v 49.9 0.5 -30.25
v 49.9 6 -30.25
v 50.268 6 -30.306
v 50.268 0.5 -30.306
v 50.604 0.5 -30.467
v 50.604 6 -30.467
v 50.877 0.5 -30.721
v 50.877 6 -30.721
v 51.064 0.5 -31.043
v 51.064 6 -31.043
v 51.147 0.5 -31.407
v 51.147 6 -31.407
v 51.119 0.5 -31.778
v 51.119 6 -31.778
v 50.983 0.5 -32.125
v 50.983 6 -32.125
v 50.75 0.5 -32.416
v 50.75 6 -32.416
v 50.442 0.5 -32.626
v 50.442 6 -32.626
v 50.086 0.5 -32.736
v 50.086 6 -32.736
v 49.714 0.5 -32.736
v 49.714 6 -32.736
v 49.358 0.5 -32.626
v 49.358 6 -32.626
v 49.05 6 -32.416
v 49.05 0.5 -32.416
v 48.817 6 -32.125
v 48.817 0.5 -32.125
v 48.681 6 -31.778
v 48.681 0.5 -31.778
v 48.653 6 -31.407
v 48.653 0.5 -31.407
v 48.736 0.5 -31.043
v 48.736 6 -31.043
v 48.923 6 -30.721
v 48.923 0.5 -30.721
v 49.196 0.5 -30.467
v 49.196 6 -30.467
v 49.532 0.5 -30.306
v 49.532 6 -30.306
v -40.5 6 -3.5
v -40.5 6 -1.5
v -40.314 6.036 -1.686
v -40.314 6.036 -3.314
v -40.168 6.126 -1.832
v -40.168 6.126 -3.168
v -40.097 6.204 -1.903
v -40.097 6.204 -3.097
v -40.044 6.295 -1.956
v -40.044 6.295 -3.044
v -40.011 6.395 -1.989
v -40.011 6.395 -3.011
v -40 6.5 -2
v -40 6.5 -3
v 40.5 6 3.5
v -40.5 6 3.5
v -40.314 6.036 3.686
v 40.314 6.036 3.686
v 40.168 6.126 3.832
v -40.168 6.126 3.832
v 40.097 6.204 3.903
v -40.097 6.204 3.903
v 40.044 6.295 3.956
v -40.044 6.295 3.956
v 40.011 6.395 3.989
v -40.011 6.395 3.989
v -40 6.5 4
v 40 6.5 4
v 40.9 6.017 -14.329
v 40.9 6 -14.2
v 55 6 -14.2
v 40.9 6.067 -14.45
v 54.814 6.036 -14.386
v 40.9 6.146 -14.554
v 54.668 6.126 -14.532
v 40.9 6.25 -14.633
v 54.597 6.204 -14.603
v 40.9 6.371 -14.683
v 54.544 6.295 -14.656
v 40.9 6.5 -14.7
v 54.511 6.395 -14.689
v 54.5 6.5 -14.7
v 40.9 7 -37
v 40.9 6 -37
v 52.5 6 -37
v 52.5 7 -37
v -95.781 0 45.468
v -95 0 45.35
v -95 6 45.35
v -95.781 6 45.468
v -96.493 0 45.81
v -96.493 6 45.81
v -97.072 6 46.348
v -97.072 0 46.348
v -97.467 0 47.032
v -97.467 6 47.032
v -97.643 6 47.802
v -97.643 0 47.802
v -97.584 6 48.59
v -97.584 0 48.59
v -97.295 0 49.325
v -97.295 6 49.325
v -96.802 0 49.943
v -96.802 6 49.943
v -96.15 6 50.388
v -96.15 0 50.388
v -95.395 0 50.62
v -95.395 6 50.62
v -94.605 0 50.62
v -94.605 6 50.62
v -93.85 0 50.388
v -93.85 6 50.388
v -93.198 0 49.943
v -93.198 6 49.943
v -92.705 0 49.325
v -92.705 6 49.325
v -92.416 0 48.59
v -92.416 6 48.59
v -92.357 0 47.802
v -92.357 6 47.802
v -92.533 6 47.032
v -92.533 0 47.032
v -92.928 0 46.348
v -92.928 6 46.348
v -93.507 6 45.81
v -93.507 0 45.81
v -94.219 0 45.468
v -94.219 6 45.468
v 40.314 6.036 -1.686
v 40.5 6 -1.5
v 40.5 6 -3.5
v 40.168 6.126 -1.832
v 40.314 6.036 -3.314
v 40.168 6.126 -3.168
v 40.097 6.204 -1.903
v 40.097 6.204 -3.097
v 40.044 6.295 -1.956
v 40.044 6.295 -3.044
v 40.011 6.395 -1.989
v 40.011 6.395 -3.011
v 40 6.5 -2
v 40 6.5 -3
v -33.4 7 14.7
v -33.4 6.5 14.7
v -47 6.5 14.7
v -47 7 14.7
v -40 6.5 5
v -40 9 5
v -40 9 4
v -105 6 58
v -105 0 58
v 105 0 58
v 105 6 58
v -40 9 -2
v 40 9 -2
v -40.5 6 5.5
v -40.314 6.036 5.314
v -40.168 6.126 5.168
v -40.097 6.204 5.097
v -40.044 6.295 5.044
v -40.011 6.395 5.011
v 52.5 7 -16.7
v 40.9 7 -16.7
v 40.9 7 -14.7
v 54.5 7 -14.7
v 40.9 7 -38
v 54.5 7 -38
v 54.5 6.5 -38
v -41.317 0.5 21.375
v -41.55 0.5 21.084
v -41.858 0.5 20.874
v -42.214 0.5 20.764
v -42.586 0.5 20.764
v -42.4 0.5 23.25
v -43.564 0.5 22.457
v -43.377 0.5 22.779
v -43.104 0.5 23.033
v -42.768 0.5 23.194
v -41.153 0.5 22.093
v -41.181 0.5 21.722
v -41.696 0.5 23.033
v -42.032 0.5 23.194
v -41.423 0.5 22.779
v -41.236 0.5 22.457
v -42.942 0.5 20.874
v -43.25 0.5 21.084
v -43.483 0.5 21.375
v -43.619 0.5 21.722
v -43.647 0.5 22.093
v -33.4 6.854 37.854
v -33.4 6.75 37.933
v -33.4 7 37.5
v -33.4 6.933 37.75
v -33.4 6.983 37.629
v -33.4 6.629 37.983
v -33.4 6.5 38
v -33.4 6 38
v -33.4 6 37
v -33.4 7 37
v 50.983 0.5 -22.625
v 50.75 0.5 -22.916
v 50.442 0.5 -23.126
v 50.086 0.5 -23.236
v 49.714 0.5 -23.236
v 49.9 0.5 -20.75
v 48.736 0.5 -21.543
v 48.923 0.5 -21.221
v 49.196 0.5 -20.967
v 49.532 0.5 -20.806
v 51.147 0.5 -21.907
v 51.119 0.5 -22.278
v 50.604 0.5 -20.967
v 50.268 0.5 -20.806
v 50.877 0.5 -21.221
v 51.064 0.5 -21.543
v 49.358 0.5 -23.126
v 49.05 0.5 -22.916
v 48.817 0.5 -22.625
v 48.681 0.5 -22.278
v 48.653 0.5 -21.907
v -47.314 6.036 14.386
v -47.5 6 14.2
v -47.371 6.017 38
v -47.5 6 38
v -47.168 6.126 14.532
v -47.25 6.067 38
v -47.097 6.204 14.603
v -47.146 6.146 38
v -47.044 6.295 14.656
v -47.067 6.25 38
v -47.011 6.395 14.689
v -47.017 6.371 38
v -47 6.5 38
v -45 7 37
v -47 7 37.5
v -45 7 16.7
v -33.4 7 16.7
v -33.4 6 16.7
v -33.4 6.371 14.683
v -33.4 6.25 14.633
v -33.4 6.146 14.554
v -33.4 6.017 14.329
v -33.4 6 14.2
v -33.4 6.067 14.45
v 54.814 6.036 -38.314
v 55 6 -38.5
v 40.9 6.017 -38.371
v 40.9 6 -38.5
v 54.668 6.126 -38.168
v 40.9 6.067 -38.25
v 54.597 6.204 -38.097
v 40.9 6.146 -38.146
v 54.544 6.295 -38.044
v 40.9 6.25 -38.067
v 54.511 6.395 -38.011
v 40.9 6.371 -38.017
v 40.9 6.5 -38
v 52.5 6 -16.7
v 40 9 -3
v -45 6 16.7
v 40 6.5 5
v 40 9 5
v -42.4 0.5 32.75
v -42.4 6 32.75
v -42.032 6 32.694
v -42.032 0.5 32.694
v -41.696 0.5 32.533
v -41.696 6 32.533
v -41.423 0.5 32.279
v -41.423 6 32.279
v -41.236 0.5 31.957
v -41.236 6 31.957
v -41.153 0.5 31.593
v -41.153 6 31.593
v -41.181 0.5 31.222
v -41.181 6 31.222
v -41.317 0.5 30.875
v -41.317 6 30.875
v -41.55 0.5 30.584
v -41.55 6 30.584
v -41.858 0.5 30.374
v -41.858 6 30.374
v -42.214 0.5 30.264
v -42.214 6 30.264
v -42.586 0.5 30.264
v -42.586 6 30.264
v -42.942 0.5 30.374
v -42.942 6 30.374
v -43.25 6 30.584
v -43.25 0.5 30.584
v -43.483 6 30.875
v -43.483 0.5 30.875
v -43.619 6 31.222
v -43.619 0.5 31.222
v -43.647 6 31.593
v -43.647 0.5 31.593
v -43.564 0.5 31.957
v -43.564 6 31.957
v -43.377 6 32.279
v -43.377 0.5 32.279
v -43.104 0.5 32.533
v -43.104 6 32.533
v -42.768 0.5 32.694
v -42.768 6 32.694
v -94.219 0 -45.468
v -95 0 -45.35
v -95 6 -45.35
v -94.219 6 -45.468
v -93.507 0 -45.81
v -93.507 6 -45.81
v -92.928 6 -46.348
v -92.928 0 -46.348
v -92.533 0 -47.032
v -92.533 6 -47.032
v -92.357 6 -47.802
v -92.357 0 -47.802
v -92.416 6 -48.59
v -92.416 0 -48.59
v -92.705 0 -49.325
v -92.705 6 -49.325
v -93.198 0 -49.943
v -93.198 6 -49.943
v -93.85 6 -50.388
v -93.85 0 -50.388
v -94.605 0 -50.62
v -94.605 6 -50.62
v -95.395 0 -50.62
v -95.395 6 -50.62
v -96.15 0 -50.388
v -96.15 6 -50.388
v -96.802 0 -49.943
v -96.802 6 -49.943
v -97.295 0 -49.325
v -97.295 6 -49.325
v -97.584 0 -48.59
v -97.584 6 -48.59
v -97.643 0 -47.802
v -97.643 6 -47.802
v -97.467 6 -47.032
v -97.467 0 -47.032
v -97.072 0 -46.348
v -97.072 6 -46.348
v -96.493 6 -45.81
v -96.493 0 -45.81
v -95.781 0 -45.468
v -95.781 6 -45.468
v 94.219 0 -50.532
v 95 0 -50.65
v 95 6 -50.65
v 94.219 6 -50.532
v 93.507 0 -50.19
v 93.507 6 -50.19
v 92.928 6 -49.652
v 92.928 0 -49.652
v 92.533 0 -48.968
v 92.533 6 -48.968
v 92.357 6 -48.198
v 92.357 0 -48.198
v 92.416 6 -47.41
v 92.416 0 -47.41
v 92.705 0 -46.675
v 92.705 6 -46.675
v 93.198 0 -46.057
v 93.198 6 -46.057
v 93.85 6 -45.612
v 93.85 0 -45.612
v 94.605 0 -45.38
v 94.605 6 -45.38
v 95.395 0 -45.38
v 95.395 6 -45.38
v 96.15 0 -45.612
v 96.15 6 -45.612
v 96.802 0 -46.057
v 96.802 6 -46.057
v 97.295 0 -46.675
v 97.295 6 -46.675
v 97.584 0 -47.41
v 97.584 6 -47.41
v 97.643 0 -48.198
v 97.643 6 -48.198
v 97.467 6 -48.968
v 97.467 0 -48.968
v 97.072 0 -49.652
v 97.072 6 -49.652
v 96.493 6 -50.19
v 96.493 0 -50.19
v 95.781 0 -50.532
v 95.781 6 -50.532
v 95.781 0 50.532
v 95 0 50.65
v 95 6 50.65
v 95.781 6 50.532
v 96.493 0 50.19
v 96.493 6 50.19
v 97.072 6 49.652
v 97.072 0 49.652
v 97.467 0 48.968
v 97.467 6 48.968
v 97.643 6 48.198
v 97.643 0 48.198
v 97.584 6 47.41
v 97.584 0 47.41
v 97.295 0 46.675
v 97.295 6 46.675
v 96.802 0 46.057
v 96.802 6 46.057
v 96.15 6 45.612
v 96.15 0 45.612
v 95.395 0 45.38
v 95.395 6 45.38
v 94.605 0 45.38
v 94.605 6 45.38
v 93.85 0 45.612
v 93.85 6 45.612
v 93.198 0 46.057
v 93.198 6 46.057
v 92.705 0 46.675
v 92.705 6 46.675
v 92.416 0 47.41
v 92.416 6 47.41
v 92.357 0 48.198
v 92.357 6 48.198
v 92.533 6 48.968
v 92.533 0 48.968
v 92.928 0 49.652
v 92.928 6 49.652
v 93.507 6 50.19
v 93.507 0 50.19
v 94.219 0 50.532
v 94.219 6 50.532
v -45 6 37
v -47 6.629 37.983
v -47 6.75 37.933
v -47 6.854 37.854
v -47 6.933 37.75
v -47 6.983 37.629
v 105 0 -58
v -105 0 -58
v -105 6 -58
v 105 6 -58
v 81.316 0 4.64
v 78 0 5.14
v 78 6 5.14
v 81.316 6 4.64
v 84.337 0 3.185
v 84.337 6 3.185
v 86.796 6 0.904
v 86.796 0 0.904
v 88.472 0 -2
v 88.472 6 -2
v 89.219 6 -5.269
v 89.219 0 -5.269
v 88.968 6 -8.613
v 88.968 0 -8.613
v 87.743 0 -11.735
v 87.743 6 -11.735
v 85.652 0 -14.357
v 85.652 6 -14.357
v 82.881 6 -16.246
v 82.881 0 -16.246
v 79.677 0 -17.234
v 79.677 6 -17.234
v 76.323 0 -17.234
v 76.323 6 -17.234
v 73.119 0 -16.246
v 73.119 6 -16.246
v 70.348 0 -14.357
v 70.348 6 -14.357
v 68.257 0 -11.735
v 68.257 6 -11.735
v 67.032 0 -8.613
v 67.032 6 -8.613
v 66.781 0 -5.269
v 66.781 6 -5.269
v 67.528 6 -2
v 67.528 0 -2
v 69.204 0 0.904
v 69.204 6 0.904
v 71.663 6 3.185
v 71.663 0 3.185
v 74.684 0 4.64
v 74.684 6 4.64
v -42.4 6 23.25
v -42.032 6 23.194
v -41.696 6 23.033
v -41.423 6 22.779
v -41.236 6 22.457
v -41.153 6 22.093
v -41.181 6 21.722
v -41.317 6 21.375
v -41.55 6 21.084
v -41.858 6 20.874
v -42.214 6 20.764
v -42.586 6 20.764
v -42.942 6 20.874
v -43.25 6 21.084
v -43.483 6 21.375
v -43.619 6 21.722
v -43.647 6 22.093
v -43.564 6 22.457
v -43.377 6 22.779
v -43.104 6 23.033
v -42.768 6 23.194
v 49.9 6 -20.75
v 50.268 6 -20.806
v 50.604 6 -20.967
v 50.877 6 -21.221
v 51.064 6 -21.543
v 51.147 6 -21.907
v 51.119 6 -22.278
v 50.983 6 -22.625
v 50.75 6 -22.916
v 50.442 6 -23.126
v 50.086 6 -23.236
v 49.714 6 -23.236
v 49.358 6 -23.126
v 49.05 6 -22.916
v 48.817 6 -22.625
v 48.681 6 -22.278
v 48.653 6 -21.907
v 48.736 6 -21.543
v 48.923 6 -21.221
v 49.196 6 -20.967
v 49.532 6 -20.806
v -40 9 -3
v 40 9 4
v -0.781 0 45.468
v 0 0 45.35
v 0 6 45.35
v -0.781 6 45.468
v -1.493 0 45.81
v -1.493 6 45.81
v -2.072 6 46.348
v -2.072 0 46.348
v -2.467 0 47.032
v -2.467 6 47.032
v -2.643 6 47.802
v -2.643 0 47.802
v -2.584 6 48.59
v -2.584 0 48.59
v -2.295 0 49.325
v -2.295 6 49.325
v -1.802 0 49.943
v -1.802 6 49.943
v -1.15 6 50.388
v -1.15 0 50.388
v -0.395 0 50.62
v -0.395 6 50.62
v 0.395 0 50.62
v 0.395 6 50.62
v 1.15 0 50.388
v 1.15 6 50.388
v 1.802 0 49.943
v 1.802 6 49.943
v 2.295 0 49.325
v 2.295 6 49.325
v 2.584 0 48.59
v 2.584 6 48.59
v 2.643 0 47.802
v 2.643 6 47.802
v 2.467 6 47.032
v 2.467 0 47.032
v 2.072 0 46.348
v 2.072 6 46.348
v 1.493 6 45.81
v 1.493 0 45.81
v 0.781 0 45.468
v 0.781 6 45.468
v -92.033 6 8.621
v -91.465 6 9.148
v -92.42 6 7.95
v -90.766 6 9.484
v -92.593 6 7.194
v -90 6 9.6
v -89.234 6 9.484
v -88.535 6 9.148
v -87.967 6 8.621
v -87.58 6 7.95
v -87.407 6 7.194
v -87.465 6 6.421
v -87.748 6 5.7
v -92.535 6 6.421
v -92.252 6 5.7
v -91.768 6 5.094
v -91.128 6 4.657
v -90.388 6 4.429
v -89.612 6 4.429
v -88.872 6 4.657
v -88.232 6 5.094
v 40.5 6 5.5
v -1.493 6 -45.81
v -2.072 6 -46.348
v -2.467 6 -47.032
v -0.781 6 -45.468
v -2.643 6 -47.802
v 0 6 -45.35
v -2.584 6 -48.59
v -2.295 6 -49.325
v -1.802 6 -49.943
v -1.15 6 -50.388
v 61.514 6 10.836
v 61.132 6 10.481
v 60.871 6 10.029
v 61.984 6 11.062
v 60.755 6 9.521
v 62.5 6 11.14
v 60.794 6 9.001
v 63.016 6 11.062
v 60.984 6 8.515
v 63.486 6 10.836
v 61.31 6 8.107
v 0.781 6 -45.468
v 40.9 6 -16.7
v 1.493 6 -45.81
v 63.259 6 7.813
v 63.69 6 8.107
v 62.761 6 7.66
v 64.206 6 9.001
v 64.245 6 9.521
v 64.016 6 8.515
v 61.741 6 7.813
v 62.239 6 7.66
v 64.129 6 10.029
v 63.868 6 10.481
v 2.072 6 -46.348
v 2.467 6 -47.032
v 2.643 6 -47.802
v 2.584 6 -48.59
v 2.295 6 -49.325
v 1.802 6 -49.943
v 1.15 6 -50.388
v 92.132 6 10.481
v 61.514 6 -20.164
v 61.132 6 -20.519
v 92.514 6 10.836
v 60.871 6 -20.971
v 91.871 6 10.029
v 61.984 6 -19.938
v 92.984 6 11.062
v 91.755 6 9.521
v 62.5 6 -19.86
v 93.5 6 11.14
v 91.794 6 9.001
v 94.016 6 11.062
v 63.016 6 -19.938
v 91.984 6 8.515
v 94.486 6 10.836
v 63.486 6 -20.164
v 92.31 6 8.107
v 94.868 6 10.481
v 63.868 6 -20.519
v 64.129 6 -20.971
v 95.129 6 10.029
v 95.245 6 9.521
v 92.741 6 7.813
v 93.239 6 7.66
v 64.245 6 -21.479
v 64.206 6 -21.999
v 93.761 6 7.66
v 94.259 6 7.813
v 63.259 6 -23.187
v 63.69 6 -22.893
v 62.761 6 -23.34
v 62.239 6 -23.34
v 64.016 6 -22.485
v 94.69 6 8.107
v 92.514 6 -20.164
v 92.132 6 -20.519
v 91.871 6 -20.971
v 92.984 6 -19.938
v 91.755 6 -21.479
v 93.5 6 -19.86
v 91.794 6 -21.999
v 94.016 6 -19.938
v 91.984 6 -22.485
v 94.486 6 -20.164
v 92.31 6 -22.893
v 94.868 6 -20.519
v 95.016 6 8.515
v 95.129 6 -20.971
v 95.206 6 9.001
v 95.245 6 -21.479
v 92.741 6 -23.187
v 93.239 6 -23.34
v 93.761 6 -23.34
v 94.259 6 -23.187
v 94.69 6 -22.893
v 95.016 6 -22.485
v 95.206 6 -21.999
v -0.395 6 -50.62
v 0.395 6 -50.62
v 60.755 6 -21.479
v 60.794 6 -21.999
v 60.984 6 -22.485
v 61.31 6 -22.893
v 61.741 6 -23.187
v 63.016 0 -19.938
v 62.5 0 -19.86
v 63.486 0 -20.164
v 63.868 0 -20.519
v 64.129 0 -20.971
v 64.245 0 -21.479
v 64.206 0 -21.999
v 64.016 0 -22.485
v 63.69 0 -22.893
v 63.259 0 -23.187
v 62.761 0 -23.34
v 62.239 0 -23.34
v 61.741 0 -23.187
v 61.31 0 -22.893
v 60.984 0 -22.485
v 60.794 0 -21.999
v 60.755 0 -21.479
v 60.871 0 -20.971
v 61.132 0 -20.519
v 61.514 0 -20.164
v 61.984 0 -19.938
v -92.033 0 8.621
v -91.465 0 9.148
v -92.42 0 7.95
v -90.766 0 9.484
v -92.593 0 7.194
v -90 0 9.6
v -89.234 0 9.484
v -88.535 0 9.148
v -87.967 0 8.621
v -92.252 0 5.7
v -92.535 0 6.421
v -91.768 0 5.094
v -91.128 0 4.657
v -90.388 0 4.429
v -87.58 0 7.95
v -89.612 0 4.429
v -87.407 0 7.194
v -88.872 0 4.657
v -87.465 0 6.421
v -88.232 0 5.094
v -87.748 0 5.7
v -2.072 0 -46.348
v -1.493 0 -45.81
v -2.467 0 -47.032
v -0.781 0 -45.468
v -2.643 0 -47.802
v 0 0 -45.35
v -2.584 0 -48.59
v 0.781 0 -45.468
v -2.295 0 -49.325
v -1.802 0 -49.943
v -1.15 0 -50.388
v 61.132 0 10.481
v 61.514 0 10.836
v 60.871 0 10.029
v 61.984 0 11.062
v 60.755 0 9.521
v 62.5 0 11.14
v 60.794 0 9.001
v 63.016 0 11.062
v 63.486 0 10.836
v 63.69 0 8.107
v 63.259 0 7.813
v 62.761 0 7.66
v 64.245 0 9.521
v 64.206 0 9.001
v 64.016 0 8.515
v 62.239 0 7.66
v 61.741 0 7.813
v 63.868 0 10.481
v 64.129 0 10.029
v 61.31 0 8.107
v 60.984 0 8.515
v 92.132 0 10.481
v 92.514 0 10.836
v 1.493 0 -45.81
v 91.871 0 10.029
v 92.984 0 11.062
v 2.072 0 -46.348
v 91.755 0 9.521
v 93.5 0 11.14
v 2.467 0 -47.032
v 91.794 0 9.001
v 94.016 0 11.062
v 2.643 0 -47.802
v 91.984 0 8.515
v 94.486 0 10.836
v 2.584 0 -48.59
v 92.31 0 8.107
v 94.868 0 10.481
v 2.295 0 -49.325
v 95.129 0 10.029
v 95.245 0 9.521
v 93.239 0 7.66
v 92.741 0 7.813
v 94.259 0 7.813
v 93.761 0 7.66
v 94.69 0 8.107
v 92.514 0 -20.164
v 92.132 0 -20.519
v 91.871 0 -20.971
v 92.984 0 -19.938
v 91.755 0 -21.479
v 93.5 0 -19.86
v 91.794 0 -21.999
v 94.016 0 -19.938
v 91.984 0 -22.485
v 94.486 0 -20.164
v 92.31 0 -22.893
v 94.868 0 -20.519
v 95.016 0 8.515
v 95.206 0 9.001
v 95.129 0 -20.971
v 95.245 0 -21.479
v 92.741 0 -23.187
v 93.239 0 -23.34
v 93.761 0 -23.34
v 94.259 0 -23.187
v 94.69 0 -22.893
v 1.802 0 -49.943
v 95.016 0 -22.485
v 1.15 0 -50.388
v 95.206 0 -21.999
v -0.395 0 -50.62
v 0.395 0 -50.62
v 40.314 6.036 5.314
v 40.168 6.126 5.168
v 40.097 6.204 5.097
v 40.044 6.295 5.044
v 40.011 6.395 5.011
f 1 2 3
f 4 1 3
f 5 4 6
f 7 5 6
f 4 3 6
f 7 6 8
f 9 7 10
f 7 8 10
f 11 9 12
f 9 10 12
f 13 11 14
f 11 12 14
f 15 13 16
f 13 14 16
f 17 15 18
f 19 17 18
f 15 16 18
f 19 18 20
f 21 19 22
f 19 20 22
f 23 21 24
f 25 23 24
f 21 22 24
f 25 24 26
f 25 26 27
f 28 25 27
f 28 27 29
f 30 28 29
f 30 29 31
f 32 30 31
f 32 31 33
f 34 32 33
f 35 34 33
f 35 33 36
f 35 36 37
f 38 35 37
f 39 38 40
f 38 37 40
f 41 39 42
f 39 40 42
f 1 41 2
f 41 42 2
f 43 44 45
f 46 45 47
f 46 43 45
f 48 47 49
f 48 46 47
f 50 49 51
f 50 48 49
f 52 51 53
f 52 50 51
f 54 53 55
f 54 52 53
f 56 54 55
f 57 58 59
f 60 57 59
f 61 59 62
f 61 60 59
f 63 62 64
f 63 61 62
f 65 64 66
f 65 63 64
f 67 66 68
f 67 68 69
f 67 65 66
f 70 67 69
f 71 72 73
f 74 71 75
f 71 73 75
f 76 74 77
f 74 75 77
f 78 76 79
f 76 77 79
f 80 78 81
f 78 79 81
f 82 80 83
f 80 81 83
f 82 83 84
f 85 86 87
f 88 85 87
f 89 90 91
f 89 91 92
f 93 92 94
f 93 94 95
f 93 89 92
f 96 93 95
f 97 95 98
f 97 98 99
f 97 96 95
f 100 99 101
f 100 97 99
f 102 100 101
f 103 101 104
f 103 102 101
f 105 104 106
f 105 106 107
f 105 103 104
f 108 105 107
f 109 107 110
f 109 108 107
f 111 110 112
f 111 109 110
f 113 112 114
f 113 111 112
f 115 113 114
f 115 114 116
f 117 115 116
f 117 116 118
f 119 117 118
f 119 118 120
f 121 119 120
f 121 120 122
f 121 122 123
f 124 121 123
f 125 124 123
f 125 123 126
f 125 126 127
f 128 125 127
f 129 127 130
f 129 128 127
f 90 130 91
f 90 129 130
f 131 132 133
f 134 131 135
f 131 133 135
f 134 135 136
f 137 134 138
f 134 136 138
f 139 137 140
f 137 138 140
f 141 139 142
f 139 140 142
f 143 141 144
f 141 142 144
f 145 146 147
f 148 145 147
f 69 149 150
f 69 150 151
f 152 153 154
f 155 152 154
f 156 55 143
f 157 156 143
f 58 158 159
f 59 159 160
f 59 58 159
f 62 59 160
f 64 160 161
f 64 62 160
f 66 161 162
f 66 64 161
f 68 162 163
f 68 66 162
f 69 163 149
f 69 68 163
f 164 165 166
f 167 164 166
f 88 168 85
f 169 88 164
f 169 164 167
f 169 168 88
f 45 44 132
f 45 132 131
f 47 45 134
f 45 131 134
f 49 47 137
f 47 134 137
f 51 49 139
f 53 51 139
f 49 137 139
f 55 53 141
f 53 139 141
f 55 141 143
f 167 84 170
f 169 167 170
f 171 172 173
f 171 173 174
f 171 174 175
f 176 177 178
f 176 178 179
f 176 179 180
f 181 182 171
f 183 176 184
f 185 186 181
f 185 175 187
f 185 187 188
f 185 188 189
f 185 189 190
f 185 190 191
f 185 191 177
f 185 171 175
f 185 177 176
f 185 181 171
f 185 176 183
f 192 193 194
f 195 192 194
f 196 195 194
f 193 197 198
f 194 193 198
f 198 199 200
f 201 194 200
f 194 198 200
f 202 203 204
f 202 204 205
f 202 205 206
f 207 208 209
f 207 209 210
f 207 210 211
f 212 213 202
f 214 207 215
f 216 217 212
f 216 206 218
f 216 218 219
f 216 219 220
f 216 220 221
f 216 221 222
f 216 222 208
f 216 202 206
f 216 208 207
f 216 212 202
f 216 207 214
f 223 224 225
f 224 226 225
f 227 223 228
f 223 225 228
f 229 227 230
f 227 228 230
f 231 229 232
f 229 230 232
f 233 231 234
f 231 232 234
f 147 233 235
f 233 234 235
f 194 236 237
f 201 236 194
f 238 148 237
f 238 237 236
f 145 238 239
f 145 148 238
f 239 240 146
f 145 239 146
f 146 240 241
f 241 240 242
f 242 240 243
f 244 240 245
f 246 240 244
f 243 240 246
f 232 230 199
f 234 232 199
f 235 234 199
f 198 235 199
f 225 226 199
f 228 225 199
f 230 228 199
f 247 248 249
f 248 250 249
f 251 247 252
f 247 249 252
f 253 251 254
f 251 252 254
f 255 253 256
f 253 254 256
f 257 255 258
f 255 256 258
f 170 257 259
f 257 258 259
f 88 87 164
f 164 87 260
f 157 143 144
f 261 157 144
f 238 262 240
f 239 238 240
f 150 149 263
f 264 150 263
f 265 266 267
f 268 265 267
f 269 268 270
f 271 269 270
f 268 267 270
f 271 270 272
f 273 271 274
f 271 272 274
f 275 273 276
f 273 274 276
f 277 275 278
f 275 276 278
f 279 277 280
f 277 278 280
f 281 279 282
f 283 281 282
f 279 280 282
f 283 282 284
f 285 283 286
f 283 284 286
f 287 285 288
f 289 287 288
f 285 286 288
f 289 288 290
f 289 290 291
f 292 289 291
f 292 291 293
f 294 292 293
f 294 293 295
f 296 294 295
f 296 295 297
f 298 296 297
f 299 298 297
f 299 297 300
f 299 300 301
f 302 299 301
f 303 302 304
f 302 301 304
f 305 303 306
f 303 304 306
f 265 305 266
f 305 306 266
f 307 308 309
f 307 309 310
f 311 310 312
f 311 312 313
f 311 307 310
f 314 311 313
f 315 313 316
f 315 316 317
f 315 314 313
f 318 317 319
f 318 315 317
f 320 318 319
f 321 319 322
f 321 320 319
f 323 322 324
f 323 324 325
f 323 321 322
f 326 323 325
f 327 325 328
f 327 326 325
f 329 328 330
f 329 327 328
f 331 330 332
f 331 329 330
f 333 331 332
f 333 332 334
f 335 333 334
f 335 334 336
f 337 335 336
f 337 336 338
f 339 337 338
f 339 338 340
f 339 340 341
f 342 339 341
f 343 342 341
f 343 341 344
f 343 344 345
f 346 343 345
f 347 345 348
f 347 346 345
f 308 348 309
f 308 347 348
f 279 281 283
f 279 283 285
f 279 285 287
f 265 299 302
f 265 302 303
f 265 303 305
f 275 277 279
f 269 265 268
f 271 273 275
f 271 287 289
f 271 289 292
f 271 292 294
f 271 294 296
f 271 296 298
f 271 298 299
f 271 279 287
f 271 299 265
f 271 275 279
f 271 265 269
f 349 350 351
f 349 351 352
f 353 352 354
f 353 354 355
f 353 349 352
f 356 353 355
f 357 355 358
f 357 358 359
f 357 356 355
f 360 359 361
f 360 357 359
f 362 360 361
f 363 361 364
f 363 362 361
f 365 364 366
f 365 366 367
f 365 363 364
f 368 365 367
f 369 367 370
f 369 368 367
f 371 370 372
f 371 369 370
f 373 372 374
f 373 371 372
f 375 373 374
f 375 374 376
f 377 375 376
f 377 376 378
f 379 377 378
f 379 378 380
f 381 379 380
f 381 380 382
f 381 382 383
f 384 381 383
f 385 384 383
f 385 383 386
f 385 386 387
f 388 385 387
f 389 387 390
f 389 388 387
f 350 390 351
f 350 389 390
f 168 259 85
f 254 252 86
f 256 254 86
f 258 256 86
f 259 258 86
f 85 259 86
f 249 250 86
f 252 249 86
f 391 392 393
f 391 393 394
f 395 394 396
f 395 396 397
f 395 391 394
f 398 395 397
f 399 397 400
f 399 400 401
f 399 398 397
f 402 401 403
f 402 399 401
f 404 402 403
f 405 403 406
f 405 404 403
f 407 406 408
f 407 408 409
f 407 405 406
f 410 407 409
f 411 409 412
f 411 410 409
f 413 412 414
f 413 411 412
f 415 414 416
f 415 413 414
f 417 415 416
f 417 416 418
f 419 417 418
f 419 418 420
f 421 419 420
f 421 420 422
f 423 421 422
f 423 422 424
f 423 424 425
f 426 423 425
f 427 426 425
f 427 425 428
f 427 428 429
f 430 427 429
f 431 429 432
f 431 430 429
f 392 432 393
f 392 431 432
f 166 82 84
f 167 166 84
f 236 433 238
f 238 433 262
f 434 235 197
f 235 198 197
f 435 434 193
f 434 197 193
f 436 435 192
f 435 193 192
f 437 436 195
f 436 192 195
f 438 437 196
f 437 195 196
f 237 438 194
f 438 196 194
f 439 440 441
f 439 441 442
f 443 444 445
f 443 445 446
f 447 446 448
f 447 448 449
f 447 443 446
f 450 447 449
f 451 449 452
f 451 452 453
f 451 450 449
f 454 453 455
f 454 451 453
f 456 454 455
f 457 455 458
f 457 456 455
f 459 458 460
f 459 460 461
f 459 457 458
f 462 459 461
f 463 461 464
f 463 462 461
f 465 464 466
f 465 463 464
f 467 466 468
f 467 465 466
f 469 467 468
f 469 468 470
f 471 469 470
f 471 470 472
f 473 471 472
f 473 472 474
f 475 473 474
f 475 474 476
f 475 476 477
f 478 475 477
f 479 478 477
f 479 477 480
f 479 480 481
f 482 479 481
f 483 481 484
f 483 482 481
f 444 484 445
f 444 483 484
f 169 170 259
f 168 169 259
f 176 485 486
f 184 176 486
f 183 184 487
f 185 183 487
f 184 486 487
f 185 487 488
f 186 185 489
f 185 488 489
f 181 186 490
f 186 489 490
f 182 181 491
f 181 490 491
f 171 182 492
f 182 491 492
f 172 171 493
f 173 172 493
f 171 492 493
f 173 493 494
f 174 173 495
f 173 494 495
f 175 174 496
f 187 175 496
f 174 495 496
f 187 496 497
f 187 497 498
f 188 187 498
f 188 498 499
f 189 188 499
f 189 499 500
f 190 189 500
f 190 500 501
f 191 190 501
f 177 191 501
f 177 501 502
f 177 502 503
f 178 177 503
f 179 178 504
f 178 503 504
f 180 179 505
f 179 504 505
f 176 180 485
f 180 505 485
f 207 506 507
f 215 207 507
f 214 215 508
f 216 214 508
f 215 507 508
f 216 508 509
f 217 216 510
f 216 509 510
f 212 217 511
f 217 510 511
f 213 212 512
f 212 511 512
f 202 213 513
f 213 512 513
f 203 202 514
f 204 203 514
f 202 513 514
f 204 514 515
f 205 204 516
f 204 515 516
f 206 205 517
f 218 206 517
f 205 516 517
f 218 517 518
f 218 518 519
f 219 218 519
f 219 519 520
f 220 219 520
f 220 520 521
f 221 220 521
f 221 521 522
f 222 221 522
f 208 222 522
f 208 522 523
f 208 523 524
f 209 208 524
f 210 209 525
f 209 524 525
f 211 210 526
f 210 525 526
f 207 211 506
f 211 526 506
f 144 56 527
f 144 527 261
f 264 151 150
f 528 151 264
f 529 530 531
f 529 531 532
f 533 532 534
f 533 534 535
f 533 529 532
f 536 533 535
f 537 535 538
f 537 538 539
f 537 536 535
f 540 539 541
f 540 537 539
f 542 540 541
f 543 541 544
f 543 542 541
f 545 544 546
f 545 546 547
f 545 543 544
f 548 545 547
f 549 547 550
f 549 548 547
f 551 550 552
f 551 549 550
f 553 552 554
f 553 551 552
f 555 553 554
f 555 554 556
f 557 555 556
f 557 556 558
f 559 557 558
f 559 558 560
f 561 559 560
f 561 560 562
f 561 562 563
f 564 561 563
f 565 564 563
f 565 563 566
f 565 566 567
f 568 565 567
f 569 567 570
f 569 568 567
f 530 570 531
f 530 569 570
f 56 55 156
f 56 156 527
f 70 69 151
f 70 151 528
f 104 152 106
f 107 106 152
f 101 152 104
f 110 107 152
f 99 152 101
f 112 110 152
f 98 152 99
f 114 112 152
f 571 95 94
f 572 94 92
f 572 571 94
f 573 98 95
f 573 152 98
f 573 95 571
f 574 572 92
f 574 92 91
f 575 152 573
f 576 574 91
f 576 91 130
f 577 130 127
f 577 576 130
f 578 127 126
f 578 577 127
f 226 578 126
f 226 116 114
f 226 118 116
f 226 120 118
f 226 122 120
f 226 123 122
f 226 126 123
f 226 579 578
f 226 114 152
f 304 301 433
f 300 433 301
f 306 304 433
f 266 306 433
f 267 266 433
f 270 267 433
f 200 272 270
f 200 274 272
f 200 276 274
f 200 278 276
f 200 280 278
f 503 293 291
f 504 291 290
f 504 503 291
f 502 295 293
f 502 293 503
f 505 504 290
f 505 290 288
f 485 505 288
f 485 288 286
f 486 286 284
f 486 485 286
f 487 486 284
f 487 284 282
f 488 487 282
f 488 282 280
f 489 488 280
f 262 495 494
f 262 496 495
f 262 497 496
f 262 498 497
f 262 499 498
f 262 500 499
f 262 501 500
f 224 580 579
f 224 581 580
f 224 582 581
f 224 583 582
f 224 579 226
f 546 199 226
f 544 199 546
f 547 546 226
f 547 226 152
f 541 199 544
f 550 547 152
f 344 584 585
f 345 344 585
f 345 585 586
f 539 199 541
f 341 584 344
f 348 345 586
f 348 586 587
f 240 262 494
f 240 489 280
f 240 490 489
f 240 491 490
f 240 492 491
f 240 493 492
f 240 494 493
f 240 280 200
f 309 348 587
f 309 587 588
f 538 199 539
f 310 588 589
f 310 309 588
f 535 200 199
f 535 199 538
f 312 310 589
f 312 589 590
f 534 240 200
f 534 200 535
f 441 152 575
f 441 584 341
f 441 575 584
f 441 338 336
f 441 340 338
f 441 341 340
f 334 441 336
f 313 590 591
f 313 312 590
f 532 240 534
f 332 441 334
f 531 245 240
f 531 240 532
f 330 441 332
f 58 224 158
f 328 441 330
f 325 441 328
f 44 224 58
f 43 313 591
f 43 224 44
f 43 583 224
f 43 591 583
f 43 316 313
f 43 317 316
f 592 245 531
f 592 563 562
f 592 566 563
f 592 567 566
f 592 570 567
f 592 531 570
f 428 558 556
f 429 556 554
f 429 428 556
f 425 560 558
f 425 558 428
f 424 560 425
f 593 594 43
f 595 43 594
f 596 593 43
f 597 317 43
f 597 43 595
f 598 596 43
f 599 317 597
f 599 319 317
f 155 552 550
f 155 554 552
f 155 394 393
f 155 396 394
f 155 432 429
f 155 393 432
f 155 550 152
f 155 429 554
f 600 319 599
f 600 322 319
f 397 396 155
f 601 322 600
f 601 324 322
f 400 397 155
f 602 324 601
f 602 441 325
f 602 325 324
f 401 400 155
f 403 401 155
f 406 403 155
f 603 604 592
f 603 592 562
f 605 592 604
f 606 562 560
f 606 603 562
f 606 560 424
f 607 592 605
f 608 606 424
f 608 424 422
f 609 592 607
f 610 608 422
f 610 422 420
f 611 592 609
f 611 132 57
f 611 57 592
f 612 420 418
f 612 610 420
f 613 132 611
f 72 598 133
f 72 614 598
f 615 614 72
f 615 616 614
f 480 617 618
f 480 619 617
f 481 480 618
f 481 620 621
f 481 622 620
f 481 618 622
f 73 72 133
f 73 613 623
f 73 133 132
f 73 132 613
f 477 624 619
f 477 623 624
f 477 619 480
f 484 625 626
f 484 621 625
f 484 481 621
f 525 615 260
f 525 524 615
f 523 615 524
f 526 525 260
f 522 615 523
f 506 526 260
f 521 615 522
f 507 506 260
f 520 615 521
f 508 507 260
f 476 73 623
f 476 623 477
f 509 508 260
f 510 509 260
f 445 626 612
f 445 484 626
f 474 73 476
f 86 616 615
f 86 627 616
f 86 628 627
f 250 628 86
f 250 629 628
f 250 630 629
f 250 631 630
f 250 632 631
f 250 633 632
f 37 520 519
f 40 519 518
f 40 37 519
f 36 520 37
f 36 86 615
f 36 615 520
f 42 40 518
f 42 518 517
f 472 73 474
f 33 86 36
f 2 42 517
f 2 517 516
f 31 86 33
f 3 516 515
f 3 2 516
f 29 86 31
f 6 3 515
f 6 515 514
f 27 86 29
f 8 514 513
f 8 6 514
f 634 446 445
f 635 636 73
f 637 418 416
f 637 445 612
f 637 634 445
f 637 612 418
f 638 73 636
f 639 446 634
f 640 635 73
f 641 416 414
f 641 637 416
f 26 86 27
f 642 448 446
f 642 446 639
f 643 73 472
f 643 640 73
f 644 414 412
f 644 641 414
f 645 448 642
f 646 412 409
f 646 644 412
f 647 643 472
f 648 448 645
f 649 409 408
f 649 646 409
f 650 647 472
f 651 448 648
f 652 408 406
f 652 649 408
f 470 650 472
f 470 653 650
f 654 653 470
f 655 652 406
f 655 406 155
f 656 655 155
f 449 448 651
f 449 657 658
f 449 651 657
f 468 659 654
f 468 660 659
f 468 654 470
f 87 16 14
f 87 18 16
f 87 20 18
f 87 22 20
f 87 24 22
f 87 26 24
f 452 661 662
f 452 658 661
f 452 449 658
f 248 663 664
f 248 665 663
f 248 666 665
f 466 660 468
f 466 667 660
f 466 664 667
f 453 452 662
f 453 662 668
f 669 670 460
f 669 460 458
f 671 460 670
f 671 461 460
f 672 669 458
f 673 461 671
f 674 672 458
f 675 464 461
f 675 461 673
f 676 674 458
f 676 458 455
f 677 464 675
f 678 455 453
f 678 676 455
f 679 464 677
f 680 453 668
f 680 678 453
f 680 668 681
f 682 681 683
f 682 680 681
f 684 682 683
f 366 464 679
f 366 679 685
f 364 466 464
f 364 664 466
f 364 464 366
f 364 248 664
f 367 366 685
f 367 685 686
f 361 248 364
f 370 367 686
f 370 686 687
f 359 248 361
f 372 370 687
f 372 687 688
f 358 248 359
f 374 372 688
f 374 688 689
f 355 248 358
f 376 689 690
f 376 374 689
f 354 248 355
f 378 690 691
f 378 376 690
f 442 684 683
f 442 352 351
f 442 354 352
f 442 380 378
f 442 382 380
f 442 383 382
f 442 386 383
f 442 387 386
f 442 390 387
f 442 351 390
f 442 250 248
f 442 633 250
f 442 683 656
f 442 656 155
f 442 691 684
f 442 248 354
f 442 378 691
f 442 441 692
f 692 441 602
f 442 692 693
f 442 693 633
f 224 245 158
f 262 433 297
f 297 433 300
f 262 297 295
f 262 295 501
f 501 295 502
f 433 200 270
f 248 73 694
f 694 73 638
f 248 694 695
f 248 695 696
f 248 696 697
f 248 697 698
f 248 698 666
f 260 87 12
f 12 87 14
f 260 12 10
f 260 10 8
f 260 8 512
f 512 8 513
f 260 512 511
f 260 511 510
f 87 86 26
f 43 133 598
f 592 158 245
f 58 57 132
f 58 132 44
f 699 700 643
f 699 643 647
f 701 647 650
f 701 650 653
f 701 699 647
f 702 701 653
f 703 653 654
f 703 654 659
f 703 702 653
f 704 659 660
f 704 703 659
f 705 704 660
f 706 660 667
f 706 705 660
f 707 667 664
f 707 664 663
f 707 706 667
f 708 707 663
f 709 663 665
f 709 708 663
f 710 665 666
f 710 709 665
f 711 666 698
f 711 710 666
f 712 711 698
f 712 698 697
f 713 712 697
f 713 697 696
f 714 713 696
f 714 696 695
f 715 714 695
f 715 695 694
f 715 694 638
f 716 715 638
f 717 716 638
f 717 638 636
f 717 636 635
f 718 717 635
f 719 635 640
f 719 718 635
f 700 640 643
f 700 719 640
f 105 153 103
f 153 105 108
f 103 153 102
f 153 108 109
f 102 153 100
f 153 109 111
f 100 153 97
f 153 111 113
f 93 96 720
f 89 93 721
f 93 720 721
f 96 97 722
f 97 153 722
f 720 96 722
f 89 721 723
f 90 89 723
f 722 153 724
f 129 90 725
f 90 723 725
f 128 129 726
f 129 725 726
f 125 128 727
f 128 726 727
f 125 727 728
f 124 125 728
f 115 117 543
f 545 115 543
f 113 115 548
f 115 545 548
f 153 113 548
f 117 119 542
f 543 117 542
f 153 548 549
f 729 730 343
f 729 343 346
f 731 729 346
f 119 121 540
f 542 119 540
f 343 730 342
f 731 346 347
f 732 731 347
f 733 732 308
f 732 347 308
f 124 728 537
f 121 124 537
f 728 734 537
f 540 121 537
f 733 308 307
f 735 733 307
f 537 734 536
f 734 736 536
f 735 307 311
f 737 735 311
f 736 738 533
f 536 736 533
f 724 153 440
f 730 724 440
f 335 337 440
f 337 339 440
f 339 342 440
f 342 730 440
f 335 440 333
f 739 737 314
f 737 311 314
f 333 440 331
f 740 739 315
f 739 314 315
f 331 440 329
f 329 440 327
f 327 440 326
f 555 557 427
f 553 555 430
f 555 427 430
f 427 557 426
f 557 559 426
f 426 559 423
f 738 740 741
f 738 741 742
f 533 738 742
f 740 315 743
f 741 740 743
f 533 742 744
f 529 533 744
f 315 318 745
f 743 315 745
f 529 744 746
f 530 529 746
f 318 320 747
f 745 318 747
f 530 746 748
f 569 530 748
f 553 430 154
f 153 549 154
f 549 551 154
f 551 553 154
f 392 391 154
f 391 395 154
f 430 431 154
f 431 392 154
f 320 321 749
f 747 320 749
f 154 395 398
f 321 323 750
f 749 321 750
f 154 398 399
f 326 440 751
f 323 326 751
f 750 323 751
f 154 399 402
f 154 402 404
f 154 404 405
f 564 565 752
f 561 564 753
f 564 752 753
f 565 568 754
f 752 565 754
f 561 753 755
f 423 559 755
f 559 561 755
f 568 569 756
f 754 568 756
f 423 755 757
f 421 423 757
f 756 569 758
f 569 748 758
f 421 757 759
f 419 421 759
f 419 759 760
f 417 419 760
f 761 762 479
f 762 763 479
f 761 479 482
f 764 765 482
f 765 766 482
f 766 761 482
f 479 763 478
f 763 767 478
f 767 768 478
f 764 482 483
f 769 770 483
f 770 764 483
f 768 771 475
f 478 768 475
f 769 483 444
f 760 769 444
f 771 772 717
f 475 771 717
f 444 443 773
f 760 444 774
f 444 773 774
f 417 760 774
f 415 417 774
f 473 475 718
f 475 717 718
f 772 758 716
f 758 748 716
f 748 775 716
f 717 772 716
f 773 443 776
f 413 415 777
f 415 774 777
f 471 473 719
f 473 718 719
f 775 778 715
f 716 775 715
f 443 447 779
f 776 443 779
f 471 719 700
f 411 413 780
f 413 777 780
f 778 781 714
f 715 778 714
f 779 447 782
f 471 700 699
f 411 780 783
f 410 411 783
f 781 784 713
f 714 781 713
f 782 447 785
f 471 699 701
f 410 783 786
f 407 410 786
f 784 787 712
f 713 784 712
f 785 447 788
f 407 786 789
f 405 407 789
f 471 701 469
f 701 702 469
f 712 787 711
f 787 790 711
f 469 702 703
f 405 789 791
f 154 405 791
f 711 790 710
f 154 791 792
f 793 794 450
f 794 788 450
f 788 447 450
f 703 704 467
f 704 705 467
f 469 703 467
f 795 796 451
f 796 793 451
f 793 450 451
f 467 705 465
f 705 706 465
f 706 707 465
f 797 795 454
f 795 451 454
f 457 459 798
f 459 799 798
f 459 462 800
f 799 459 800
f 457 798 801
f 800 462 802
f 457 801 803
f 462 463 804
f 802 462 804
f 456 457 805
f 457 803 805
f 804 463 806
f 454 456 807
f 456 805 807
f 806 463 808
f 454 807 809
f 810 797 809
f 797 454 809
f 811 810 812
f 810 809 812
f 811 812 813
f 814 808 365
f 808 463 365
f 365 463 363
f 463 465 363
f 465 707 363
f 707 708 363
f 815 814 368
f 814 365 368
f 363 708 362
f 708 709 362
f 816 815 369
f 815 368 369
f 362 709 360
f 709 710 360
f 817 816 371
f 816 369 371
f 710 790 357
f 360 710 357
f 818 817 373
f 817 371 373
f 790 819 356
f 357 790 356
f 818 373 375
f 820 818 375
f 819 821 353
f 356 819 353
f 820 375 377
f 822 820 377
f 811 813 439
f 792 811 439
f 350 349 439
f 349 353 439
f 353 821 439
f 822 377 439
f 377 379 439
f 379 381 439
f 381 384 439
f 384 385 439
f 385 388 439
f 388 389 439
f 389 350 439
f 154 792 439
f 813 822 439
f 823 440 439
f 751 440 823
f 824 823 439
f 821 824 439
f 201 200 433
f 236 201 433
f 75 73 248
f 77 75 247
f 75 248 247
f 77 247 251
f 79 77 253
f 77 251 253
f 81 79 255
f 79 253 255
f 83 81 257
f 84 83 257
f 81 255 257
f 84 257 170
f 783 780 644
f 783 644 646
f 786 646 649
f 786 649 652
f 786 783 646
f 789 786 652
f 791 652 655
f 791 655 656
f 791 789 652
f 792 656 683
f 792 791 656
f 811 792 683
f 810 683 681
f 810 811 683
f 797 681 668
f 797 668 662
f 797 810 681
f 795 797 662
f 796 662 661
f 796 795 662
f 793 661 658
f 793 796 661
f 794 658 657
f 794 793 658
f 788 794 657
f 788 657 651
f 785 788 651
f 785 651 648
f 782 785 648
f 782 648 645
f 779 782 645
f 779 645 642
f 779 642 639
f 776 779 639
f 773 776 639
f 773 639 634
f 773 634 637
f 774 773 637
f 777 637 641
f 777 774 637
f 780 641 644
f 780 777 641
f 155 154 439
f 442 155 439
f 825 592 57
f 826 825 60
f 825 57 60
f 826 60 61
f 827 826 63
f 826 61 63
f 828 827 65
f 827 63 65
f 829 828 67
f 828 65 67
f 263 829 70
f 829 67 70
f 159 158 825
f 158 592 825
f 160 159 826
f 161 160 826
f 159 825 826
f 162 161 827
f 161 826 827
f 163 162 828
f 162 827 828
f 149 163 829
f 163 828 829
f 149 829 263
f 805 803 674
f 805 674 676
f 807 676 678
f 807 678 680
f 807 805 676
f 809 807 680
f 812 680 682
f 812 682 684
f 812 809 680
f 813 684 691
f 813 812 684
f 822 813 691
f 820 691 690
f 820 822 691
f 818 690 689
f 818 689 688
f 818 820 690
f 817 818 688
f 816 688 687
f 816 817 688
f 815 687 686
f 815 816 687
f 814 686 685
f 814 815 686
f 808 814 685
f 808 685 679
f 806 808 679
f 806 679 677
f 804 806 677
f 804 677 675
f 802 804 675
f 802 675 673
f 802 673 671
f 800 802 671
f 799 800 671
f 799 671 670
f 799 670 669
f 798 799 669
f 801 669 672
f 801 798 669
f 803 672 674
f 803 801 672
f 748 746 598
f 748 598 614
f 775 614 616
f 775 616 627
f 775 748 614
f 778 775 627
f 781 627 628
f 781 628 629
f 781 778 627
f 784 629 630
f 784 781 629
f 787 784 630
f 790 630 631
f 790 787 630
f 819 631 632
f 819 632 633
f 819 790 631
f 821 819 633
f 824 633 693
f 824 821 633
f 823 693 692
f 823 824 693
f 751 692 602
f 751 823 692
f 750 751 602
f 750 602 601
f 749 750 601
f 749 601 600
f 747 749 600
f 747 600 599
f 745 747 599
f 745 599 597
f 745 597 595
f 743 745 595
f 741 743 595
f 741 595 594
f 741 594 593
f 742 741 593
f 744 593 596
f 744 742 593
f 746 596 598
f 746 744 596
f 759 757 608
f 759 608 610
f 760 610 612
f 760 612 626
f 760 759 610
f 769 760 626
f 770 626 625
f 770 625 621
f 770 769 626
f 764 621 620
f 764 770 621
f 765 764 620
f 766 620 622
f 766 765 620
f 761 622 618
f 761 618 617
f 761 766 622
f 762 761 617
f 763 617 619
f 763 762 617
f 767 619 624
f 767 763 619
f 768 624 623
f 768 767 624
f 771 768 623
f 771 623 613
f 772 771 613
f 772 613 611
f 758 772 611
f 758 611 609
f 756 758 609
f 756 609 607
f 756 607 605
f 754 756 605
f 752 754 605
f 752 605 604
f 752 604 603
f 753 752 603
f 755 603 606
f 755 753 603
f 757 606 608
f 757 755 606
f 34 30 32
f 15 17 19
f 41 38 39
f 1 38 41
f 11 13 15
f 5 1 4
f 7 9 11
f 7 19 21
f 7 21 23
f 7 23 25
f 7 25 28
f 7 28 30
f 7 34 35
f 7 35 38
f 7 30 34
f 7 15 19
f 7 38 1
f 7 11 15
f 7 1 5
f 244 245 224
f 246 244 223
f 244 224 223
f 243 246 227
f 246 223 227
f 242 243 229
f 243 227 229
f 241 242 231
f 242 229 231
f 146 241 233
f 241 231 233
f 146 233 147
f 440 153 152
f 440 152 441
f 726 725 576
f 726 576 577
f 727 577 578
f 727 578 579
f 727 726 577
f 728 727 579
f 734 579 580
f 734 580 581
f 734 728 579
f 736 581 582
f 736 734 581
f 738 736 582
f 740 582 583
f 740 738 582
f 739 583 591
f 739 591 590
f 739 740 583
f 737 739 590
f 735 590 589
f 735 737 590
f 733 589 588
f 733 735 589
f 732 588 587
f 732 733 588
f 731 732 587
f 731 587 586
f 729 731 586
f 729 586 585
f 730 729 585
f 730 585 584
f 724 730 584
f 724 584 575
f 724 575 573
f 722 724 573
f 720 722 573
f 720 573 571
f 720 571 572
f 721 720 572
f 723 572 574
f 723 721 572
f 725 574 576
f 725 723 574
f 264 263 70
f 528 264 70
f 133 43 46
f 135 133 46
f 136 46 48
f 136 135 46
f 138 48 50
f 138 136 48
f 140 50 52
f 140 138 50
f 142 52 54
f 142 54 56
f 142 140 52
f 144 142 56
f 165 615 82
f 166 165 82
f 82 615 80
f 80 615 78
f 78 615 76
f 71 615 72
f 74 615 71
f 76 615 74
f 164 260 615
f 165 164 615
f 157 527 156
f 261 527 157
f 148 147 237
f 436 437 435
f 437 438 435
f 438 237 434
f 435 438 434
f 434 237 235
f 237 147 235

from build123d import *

# Parameters (mm, degrees)
SKETCH1_W           = 210
SKETCH1_H           = 116
SKETCH1_R           = 2.65
SKETCH1_R_2         = 11.25
SKETCH1_R_3         = 1.75
SKETCH1_R_4         = 2.6
BOSS_EXTRUDE1_DEPTH = 6
SKETCH4_R           = 1.25
CUT_EXTRUDE1_DEPTH  = 5.5
BOSS_EXTRUDE3_DEPTH = 1
BOSS_EXTRUDE4_DEPTH = 1
SKETCH4_5_R         = 1.25
CUT_EXTRUDE2_DEPTH  = 5.5
SKETCH6_W           = 80
SKETCH6_H           = 1
BOSS_EXTRUDE5_DEPTH = 3
FILLET1_R           = 0.5


with BuildPart() as part:
    # Sketch1 → Boss-Extrude1 (new body)
    with BuildSketch(Plane(origin=(0, 0, 0), x_dir=(1, 0, 0), z_dir=(0, 1, 0))):
        Rectangle(SKETCH1_W, SKETCH1_H)
        with Locations(Location((-95, 48, 0), (0, 0, 270))):
            Circle(SKETCH1_R, mode=Mode.SUBTRACT)
        with Locations(Location((95, 48, 0), (0, 0, 90))):
            Circle(SKETCH1_R, mode=Mode.SUBTRACT)
        with Locations(Location((95, -48, 0), (0, 0, 270))):
            Circle(SKETCH1_R, mode=Mode.SUBTRACT)
        with Locations(Location((-95, -48, 0), (0, 0, 90))):
            Circle(SKETCH1_R, mode=Mode.SUBTRACT)
        with Locations(Location((78, 6.11, 0), (0, 0, 270))):
            Circle(SKETCH1_R_2, mode=Mode.SUBTRACT)
        with Locations(Location((93.5, 21.61, 0), (0, 0, 270))):
            Circle(SKETCH1_R_3, mode=Mode.SUBTRACT)
        with Locations(Location((62.5, 21.61, 0), (0, 0, 270))):
            Circle(SKETCH1_R_3, mode=Mode.SUBTRACT)
        with Locations(Location((62.5, -9.39, 0), (0, 0, 270))):
            Circle(SKETCH1_R_3, mode=Mode.SUBTRACT)
        with Locations(Location((93.5, -9.39, 0), (0, 0, 270))):
            Circle(SKETCH1_R_3, mode=Mode.SUBTRACT)
        with Locations(Location((-90, -7, 0), (0, 0, 270))):
            Circle(SKETCH1_R_4, mode=Mode.SUBTRACT)
        with Locations(Location((0, 48, 0), (0, 0, 270))):
            Circle(SKETCH1_R, mode=Mode.SUBTRACT)
        with Locations(Location((0, -48, 0), (0, 0, 90))):
            Circle(SKETCH1_R, mode=Mode.SUBTRACT)
    extrude(amount=BOSS_EXTRUDE1_DEPTH)

    # Sketch4 → Cut-Extrude1 (cut)
    with BuildSketch(Plane(origin=(0, 6, 0), x_dir=(1, 0, 0), z_dir=(0, 1, 0))):
        with Locations(Location((49.9, 31.5, 0), (0, 0, 270))):
            Circle(SKETCH4_R)
        with Locations(Location((49.9, 22, 0), (0, 0, 270))):
            Circle(SKETCH4_R)
    extrude(amount=-CUT_EXTRUDE1_DEPTH, mode=Mode.SUBTRACT)

    # Sketch4<3> → Boss-Extrude3 (add)
    with BuildSketch(Plane(origin=(0, 6, 0), x_dir=(1, 0, 0), z_dir=(0, 1, 0))):
        Polygon((40.9, 37), (52.5, 37), (52.5, 16.7), (40.9, 16.7), (40.9, 14.7), (54.5, 14.7), (54.5, 38), (40.9, 38), align=None)
    extrude(amount=BOSS_EXTRUDE3_DEPTH)

    # Sketch4<4> → Boss-Extrude4 (add)
    with BuildSketch(Plane(origin=(0, 6, 0), x_dir=(1, 0, 0), z_dir=(0, 1, 0))):
        Polygon((-45, -16.7), (-33.4, -16.7), (-33.4, -14.7), (-47, -14.7), (-47, -38), (-33.4, -38), (-33.4, -37), (-45, -37), align=None)
    extrude(amount=BOSS_EXTRUDE4_DEPTH)

    # Sketch4<5> → Cut-Extrude2 (cut)
    with BuildSketch(Plane(origin=(0, 6, 0), x_dir=(1, 0, 0), z_dir=(0, 1, 0))):
        with Locations(Location((-42.4, -22, 0), (0, 0, 270))):
            Circle(SKETCH4_5_R)
        with Locations(Location((-42.4, -31.5, 0), (0, 0, 270))):
            Circle(SKETCH4_5_R)
    extrude(amount=-CUT_EXTRUDE2_DEPTH, mode=Mode.SUBTRACT)

    # Sketch6 → Boss-Extrude5 (add)
    with BuildSketch(Plane(origin=(0, 6, 0), x_dir=(1, 0, 0), z_dir=(0, 1, 0))):
        with Locations((0, 2.5)):
            Rectangle(SKETCH6_W, SKETCH6_H)
        with Locations((0, -4.5)):
            Rectangle(SKETCH6_W, SKETCH6_H)
    extrude(amount=BOSS_EXTRUDE5_DEPTH)

    # Fillet1
    fillet1_edges = [part.edges().sort_by_distance(p)[0] for p in [
        (54.5, 6, -26.35),
        (40, 6, -2.5),
        (40, 6, 4.5),
        (0, 6, -2),
        (0, 6, -3),
        (-40, 6, -2.5),
        (0, 6, 4),
        (-40, 6, 4.5),
        (0, 6, 5),
        (-47, 6, 26.35),
        (47.7, 6, -38),
        (47.7, 6, -14.7),
        (-40.2, 6, 14.7),
        (-40.2, 7, 38),
    ]]
    fillet(fillet1_edges, radius=FILLET1_R - 0.0001)  # a hair under: the kernel refuses the full size


solid = part.part
